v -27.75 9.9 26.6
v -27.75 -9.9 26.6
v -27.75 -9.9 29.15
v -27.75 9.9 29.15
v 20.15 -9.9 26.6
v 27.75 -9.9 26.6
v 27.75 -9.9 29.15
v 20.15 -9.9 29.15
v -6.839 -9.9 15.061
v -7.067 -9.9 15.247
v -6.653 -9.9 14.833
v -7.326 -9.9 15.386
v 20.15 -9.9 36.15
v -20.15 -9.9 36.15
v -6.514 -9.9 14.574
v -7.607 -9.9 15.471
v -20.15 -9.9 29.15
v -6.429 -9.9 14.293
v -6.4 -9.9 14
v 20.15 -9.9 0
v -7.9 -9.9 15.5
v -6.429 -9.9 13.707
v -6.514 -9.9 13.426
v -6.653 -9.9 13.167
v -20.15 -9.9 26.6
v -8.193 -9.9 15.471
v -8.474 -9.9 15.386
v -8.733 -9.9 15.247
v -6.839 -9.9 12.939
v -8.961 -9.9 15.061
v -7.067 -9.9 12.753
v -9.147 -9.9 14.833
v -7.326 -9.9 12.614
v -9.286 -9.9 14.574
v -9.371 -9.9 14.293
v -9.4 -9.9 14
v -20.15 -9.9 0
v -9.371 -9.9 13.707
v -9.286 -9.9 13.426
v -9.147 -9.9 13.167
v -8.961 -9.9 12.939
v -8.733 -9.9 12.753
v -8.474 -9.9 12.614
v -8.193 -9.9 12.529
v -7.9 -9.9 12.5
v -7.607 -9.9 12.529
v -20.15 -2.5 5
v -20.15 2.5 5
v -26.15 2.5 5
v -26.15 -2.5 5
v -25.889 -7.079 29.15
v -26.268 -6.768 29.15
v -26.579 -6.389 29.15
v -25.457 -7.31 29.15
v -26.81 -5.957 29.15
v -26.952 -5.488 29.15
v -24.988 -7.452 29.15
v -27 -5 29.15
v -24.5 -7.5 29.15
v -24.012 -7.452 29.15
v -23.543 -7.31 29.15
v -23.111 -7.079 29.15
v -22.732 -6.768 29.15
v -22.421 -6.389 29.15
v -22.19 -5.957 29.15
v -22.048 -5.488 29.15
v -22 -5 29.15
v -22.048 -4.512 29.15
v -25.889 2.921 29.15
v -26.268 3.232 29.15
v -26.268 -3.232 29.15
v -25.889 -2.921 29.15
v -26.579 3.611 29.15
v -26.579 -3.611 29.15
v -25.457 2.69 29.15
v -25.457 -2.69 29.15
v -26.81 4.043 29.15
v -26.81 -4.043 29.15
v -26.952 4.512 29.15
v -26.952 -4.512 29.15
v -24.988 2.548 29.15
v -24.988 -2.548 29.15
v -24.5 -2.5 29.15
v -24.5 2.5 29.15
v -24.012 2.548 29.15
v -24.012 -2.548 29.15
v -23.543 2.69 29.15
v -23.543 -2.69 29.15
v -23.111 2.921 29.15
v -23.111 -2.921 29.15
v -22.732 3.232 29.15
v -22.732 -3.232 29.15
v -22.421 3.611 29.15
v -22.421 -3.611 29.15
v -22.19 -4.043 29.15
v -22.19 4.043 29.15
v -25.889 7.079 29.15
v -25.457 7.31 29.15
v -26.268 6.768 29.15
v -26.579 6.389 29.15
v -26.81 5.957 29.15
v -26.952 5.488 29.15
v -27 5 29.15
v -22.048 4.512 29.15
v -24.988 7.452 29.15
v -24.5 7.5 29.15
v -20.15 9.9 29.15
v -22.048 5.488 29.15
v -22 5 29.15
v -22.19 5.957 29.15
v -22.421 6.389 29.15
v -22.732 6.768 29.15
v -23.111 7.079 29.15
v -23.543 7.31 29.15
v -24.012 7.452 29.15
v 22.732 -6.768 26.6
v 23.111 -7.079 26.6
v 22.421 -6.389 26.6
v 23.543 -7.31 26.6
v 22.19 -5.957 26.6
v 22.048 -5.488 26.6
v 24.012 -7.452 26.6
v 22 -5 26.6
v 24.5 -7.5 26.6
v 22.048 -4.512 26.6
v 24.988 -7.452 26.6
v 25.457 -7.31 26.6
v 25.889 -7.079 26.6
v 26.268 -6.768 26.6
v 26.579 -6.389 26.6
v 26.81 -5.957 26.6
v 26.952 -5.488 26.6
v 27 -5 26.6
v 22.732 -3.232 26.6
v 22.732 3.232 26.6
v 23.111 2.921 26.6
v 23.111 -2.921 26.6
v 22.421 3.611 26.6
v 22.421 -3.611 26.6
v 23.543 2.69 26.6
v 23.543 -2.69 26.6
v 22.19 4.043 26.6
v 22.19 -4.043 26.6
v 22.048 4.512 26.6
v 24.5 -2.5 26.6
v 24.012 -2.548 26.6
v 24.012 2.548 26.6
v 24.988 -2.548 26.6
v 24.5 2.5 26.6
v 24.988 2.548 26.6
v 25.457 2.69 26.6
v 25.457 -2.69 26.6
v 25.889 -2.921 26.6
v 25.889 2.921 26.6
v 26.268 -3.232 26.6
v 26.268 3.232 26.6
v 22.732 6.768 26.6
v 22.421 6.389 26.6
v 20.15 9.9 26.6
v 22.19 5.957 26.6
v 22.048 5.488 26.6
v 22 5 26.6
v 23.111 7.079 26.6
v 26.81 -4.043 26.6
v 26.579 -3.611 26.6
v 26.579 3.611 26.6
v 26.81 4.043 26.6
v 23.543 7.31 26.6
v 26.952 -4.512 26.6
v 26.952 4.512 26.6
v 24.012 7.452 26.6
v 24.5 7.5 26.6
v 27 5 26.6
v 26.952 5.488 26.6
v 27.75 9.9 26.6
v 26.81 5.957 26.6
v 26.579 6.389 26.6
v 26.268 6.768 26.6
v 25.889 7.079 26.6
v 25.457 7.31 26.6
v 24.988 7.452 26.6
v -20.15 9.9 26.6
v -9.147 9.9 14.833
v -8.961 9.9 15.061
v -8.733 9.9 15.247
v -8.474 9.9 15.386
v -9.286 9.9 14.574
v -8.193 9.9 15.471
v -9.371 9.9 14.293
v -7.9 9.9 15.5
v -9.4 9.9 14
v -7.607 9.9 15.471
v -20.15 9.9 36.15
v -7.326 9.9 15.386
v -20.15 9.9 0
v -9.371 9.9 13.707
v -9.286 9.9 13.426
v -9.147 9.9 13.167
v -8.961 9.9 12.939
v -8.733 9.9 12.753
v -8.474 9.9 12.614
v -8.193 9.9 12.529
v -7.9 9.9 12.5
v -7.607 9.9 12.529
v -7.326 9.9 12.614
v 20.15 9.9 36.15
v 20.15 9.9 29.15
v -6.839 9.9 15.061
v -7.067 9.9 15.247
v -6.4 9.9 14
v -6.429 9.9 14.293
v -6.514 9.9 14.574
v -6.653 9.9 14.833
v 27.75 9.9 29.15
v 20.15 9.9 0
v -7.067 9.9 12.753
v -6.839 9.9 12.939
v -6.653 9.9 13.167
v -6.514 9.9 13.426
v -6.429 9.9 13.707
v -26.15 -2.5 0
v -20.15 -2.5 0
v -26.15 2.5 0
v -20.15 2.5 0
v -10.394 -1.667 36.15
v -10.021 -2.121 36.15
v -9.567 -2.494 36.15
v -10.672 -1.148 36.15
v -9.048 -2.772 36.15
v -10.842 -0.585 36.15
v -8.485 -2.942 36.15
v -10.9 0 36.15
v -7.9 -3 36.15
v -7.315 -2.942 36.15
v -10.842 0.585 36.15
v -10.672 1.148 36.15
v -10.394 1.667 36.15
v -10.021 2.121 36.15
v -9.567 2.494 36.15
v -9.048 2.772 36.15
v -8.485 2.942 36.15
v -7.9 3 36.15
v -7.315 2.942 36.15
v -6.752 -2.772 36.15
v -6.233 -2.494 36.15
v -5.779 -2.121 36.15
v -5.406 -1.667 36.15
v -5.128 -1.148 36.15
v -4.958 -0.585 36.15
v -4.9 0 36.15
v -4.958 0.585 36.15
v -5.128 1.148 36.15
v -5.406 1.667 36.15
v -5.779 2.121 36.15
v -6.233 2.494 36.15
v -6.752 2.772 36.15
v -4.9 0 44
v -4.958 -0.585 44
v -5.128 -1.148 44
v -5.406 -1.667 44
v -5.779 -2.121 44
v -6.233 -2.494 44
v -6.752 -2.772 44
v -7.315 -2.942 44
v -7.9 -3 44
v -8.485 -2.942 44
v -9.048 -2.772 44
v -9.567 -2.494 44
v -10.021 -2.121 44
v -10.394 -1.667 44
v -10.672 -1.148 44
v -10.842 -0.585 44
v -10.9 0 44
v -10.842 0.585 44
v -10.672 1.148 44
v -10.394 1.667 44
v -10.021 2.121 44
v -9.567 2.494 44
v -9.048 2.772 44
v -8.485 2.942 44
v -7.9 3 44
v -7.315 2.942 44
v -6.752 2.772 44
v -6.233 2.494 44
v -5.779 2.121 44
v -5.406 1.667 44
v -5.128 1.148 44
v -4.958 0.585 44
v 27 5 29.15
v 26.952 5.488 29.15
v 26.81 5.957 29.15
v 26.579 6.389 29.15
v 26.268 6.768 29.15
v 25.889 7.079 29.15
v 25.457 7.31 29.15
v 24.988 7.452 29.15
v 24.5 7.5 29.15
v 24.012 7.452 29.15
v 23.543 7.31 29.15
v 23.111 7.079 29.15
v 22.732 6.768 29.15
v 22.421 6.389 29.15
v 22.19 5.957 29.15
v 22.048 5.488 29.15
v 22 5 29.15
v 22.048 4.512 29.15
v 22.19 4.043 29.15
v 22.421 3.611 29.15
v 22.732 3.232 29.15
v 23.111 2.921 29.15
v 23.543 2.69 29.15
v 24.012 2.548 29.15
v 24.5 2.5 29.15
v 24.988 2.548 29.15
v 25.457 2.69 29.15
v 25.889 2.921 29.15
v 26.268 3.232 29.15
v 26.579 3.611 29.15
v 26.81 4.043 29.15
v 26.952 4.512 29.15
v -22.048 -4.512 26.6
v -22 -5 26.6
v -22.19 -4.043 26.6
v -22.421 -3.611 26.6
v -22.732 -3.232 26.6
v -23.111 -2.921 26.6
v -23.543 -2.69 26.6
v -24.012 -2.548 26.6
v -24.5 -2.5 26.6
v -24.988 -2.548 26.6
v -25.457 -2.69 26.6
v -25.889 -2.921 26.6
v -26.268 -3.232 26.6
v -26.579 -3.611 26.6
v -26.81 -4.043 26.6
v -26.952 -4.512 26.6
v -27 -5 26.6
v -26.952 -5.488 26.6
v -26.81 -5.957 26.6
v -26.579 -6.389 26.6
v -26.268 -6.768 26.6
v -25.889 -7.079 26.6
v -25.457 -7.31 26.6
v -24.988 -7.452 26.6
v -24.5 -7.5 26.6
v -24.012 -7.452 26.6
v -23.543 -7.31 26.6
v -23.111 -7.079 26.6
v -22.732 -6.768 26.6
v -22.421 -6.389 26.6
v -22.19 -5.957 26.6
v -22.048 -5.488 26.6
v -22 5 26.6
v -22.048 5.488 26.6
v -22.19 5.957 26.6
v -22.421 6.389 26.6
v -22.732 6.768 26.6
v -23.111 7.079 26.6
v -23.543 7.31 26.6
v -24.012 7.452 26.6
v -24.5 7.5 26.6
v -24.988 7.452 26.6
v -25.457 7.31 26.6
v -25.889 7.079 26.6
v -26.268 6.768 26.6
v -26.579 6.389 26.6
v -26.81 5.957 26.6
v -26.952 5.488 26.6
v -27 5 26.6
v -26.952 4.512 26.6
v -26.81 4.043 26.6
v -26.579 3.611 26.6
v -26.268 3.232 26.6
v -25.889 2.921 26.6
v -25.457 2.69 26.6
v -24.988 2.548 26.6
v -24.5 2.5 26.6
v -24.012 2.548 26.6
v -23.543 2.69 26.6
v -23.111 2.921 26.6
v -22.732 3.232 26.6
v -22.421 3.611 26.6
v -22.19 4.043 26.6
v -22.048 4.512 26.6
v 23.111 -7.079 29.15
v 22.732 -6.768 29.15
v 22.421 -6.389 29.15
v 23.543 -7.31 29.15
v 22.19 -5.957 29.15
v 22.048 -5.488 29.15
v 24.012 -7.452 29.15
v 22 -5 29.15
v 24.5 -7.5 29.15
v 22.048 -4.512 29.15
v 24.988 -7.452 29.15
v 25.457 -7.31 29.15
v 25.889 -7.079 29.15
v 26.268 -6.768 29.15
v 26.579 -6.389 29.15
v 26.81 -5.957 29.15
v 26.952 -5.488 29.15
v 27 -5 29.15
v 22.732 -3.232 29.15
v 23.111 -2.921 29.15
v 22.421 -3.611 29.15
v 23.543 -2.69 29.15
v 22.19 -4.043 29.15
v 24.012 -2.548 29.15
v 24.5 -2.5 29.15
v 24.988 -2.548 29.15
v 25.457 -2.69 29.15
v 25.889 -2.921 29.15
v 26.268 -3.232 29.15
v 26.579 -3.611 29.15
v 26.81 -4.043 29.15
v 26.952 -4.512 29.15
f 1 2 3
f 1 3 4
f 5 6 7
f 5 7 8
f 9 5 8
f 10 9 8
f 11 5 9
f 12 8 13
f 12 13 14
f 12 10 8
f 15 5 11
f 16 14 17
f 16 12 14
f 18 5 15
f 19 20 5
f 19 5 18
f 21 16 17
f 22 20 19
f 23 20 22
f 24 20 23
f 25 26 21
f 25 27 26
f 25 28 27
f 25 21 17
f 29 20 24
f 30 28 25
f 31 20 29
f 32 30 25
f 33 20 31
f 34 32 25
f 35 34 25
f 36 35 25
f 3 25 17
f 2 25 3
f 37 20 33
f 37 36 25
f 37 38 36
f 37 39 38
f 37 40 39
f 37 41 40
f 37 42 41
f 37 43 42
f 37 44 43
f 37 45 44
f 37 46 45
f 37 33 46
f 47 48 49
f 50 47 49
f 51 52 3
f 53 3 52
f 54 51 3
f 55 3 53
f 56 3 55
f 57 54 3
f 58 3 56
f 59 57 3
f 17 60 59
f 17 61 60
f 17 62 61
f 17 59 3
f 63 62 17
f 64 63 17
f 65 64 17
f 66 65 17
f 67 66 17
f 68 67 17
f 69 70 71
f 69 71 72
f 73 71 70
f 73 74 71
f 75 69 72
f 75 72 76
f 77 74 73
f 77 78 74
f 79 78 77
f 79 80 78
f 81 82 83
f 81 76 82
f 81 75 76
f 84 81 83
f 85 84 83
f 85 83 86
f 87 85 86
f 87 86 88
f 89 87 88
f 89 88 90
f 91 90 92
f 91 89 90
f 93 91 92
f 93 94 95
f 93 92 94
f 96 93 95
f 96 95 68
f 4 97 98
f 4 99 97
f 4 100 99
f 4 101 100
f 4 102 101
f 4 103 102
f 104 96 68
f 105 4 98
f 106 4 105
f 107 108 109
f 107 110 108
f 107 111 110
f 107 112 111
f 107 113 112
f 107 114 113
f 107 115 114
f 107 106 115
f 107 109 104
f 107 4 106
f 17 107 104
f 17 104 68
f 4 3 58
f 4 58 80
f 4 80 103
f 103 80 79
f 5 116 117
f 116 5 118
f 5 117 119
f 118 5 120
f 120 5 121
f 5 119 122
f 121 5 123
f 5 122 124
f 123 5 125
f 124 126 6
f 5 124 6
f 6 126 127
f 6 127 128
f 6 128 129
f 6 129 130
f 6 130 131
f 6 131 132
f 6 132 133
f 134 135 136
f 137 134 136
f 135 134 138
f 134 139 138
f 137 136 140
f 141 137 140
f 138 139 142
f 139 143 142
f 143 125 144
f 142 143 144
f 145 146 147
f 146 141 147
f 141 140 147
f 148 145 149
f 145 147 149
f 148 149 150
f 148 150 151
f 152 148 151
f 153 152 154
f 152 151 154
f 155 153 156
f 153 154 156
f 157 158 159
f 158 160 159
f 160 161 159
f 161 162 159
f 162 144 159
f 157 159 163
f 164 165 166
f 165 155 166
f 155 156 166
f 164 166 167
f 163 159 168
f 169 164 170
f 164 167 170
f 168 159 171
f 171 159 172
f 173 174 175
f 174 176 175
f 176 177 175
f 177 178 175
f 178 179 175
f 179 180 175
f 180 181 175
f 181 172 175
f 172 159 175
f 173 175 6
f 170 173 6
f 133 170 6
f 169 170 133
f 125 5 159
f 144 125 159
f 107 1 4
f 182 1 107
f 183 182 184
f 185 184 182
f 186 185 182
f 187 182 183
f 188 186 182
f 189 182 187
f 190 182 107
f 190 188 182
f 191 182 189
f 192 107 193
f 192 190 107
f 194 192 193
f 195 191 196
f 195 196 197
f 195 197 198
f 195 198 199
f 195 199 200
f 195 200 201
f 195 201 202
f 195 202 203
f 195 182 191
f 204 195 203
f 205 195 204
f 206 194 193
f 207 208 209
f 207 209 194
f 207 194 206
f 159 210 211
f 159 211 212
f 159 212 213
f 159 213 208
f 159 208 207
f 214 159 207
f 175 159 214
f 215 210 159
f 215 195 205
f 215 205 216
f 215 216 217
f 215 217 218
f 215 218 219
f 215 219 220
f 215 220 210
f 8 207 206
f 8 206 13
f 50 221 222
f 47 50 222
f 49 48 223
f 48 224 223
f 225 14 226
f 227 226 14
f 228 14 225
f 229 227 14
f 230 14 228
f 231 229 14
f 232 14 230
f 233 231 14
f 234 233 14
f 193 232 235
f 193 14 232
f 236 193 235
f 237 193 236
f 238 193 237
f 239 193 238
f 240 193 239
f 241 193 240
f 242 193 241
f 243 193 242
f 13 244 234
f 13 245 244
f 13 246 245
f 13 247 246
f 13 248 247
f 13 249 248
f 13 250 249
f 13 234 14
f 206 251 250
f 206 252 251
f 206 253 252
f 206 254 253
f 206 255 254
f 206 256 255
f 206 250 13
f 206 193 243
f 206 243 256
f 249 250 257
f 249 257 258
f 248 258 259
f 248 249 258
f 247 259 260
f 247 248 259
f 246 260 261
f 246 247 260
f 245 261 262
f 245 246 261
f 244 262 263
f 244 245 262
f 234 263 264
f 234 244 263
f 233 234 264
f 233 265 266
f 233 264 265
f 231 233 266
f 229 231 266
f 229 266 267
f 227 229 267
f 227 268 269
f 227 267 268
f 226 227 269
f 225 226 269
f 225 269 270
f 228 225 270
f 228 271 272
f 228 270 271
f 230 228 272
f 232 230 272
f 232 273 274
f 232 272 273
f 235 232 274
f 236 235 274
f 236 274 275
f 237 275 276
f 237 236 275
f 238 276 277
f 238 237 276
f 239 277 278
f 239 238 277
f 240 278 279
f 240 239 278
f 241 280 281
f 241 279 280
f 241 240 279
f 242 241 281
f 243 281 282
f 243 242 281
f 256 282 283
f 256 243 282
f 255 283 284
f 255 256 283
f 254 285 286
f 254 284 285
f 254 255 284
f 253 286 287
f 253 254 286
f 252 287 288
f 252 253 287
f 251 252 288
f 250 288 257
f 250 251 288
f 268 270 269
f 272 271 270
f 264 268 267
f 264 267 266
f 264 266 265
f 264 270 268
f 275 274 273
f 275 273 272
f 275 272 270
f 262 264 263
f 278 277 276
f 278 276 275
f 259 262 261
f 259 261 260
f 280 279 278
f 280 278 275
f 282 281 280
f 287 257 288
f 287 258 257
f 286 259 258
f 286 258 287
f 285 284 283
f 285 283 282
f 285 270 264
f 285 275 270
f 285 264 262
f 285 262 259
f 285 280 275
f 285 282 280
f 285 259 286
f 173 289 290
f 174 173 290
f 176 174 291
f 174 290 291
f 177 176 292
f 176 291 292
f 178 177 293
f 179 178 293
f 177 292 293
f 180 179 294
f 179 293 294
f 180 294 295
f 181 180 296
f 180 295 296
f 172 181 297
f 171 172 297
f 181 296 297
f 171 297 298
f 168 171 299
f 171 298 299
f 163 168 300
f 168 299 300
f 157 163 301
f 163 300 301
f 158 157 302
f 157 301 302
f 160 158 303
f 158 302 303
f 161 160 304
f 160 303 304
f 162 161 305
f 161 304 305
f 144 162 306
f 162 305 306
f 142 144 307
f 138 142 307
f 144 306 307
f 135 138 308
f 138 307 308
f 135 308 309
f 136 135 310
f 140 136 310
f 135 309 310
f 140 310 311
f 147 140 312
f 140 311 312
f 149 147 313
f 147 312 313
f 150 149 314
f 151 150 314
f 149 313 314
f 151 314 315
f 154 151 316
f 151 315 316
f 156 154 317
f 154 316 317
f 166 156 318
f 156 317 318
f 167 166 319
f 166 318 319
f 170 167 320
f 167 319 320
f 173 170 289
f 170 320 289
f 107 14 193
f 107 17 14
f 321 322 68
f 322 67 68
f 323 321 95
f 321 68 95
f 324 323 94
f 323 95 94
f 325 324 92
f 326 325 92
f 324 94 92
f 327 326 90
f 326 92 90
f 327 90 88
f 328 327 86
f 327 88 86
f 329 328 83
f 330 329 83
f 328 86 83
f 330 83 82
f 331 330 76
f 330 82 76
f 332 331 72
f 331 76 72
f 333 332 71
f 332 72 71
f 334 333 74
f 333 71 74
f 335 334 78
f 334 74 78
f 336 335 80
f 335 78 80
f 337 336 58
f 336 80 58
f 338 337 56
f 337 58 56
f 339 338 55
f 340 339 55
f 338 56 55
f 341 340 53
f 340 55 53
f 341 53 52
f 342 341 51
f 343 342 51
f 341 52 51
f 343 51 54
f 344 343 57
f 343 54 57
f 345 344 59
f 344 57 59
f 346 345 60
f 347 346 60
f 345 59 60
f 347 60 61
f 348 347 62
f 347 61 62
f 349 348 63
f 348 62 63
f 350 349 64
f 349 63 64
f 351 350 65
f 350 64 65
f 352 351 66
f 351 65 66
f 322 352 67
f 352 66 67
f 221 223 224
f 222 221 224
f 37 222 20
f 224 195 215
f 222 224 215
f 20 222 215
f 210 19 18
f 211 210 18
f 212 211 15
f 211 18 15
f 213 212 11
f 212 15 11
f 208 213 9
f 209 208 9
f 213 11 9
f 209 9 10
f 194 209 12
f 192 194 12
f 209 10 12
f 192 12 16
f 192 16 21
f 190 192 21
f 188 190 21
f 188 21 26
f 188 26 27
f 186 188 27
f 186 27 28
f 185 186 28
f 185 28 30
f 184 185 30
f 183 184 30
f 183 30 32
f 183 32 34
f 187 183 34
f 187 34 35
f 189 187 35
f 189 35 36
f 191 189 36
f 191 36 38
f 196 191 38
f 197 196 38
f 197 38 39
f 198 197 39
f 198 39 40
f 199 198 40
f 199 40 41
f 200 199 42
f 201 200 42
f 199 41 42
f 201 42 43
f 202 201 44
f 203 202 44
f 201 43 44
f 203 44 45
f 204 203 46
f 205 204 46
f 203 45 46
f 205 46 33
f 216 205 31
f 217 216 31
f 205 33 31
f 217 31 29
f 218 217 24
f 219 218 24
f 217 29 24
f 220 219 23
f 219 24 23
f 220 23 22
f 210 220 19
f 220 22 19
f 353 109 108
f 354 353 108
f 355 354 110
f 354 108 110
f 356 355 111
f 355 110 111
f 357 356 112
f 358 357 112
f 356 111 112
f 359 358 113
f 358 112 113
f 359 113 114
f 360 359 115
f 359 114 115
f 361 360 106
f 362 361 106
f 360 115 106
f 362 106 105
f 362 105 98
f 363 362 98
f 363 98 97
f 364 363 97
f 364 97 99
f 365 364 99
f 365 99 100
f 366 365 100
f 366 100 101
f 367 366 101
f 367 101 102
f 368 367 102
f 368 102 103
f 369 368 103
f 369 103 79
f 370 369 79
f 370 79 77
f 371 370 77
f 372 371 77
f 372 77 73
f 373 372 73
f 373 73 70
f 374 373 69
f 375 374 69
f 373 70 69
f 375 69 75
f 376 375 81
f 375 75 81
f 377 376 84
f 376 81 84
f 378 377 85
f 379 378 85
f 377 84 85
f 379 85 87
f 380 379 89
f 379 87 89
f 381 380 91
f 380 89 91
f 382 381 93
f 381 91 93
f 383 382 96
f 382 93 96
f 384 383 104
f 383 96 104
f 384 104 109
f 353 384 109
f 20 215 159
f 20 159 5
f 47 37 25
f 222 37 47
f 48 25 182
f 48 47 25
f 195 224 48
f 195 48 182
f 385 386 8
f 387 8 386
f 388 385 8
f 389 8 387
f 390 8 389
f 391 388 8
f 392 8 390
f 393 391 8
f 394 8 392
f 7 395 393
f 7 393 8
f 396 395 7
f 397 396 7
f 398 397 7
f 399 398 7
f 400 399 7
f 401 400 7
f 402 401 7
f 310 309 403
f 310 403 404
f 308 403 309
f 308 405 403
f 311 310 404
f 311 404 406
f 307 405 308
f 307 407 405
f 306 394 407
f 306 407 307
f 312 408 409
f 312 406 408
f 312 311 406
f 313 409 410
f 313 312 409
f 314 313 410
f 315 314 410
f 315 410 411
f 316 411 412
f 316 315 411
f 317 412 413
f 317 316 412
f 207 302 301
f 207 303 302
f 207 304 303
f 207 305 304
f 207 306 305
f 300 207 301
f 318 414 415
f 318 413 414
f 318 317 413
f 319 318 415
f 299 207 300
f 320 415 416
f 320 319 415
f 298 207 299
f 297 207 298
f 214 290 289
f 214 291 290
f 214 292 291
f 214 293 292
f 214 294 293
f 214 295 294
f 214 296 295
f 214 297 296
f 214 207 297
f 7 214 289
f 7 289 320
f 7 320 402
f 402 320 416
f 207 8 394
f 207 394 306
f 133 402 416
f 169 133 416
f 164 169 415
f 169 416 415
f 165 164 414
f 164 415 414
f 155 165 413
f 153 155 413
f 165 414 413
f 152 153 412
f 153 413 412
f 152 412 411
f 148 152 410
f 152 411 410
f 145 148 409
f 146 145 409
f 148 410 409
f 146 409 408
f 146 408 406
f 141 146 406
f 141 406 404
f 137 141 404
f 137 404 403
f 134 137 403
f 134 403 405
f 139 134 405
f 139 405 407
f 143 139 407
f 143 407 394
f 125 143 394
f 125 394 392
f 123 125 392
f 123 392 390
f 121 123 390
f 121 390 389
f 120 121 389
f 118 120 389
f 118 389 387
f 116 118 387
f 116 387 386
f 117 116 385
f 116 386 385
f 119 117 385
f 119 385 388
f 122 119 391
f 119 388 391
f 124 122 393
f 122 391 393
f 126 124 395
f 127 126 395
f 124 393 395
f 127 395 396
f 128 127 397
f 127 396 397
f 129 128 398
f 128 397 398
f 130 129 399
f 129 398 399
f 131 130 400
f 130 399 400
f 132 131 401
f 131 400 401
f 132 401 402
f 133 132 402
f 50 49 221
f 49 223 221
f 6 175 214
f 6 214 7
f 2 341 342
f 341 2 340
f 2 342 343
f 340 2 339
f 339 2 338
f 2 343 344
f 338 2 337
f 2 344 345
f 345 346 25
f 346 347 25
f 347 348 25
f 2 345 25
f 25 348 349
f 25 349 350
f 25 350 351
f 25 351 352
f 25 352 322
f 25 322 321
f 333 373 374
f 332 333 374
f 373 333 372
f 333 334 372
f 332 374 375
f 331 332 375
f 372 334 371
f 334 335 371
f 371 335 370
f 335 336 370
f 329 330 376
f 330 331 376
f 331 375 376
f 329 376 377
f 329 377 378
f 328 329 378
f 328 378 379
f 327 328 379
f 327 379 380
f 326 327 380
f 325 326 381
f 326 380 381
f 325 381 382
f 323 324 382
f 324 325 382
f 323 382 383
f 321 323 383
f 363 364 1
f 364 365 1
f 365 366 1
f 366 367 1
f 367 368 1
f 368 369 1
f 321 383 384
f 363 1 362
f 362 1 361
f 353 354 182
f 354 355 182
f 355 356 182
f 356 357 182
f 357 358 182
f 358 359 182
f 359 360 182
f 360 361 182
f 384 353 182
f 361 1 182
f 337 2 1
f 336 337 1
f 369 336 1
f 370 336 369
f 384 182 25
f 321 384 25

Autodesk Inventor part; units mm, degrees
ref_plane "YZ Plane" through (0, 0, 0) normal (1, 0, 0) x (0, 1, 0)
ref_plane "XZ Plane" through (0, 0, 0) normal (0, 1, 0) x (-1, 0, 0)
ref_plane "XY Plane" through (0, 0, 0) normal (0, 0, 1) x (1, 0, 0)
sketch "Sketch1" plane through (0, 0, 0) normal (0, 0, 1) x (1, 0, 0)
  line L0 (-28.21, 0) -> (28.21, 0) projected
  line L1 (0, -13.86) -> (0, 13.86) projected
  line L2 (-20.15, 9.9) -> (20.15, 9.9)
  line L3 (20.15, 9.9) -> (20.15, -9.9)
  line L4 (20.15, -9.9) -> (-20.15, -9.9)
  line L5 (-20.15, -9.9) -> (-20.15, 9.9)
  point P0 (0, 0)
  dimension "d0" = 19.8
  dimension "d1" = 9.9
  dimension "d2" = 40.3
  dimension "d3" = 20.15
extrude "Extrusion1" add sketch "Sketch1" along normal blind 26.6
sketch "Sketch2" plane through (0, 0, 26.6) normal (0, 0, 1) x (1, 0, 0)
  line L0 (-27.75, 9.9) -> (27.75, 9.9)
  line L1 (27.75, 9.9) -> (27.75, -9.9)
  line L2 (27.75, -9.9) -> (-27.75, -9.9)
  line L3 (-27.75, -9.9) -> (-27.75, 9.9)
  line L4 (-38.85, 0) -> (38.85, 0) projected
  line L5 (0, -13.86) -> (0, 13.86) projected
  point P0 (0, 0)
  dimension "d6" = 55.5
  dimension "d7" = 19.8
  dimension "d8" = 27.75
  dimension "d9" = 9.9
extrude "Extrusion2" add sketch "Sketch2" along normal blind 2.55
sketch "Sketch3" plane through (0, 0, 29.15) normal (0, 0, 1) x (1, 0, 0)
  line L0 (-27.75, 9.9) -> (27.75, 9.9) projected
  circle A0 centre (-24.5, 5) radius 2.5
  circle A1 centre (-24.5, -5) radius 2.5
  circle A2 centre (24.5, 5) radius 2.5
  circle A3 centre (24.5, -5) radius 2.5
  point P0 (-27.75, -9.9)
  point P1 (0, 0)
  dimension "d12" = 5
  dimension "d13" = 5
  dimension "d14" = 5
  dimension "d15" = 5
  dimension "d16" = 10
  dimension "d17" = 10
  dimension "d18" = 4.9
  dimension "d19" = 19.8
  dimension "d20" = 4.9
  dimension "d21" = 49
  dimension "d22" = 24.5
extrude "Extrusion3" cut sketch "Sketch3" against normal blind 2.55
sketch "Sketch4" plane through (0, 0, 29.15) normal (0, 0, 1) x (1, 0, 0)
  line L0 (-27.75, 9.9) -> (27.75, 9.9) projected
  line L1 (27.75, -9.9) -> (-27.75, -9.9) projected
  line L2 (-20.15, -9.9) -> (-20.15, 9.9) projected
  line L3 (20.15, 9.9) -> (20.15, -9.9) projected
  point P0 (0, 0)
extrude "Extrusion4" add sketch "Sketch4" along normal blind 7
sketch "Sketch5" plane through (0, 0, 36.15) normal (0, 0, 1) x (1, 0, 0)
  circle A0 centre (-7.9, 0) radius 3
  line L0 (-27.75, -9.9) -> (-27.75, 9.9) projected
  point P0 (0, 0)
  dimension "d27" = 6
  dimension "d28" = 19.85
extrude "Extrusion5" add sketch "Sketch5" along normal blind 7.85
sketch "Sketch6" plane through (0, 0, 0) normal (0, 0, -1) x (-1, 0, 0)
  line L0 (20.15, -9.9) -> (20.15, 9.9) projected
  line L1 (20.15, 2.5) -> (26.15, 2.5)
  line L2 (26.15, 2.5) -> (26.15, -2.5)
  line L3 (26.15, -2.5) -> (20.15, -2.5)
  line L4 (20.15, -2.5) -> (20.15, 2.5)
  point P0 (0, 0)
  dimension "d31" = 6
  dimension "d32" = 2.5
  dimension "d33" = 5
extrude "Extrusion6" add sketch "Sketch6" against normal blind 5
sketch "Sketch7" plane through (-20.15, -9.9, 0) normal (0, -1, 0) x (1, 0, 0)
  line L0 (40.3, 0) -> (0, 0) projected
  line L1 (9.25, 44) -> (15.25, 44)
  line L2 (9.25, 36.15) -> (9.25, 44) projected
  line L3 (15.25, 36.15) -> (15.25, 44) projected
  circle A0 centre (12.25, 14) radius 1.5
  point P0 (20.15, 0)
  dimension "d36" = 3
  dimension "d37" = 30
extrude "Extrusion7" cut sketch "Sketch7" against normal through all
equation "\"d1\" = 0.5 * d0"
equation "\"d3\" = 0.5 * d2"
equation "\"d8\" = 0.5 * d6"
equation "\"d9\" = 0.5 * d7"
equation "\"d20\" = d18"
equation "\"d22\" = 0.5 * d21"
equation "\"d32\" = 0.5 * d33"
properties part number "ServoFutabaS3003_UpperArm"
